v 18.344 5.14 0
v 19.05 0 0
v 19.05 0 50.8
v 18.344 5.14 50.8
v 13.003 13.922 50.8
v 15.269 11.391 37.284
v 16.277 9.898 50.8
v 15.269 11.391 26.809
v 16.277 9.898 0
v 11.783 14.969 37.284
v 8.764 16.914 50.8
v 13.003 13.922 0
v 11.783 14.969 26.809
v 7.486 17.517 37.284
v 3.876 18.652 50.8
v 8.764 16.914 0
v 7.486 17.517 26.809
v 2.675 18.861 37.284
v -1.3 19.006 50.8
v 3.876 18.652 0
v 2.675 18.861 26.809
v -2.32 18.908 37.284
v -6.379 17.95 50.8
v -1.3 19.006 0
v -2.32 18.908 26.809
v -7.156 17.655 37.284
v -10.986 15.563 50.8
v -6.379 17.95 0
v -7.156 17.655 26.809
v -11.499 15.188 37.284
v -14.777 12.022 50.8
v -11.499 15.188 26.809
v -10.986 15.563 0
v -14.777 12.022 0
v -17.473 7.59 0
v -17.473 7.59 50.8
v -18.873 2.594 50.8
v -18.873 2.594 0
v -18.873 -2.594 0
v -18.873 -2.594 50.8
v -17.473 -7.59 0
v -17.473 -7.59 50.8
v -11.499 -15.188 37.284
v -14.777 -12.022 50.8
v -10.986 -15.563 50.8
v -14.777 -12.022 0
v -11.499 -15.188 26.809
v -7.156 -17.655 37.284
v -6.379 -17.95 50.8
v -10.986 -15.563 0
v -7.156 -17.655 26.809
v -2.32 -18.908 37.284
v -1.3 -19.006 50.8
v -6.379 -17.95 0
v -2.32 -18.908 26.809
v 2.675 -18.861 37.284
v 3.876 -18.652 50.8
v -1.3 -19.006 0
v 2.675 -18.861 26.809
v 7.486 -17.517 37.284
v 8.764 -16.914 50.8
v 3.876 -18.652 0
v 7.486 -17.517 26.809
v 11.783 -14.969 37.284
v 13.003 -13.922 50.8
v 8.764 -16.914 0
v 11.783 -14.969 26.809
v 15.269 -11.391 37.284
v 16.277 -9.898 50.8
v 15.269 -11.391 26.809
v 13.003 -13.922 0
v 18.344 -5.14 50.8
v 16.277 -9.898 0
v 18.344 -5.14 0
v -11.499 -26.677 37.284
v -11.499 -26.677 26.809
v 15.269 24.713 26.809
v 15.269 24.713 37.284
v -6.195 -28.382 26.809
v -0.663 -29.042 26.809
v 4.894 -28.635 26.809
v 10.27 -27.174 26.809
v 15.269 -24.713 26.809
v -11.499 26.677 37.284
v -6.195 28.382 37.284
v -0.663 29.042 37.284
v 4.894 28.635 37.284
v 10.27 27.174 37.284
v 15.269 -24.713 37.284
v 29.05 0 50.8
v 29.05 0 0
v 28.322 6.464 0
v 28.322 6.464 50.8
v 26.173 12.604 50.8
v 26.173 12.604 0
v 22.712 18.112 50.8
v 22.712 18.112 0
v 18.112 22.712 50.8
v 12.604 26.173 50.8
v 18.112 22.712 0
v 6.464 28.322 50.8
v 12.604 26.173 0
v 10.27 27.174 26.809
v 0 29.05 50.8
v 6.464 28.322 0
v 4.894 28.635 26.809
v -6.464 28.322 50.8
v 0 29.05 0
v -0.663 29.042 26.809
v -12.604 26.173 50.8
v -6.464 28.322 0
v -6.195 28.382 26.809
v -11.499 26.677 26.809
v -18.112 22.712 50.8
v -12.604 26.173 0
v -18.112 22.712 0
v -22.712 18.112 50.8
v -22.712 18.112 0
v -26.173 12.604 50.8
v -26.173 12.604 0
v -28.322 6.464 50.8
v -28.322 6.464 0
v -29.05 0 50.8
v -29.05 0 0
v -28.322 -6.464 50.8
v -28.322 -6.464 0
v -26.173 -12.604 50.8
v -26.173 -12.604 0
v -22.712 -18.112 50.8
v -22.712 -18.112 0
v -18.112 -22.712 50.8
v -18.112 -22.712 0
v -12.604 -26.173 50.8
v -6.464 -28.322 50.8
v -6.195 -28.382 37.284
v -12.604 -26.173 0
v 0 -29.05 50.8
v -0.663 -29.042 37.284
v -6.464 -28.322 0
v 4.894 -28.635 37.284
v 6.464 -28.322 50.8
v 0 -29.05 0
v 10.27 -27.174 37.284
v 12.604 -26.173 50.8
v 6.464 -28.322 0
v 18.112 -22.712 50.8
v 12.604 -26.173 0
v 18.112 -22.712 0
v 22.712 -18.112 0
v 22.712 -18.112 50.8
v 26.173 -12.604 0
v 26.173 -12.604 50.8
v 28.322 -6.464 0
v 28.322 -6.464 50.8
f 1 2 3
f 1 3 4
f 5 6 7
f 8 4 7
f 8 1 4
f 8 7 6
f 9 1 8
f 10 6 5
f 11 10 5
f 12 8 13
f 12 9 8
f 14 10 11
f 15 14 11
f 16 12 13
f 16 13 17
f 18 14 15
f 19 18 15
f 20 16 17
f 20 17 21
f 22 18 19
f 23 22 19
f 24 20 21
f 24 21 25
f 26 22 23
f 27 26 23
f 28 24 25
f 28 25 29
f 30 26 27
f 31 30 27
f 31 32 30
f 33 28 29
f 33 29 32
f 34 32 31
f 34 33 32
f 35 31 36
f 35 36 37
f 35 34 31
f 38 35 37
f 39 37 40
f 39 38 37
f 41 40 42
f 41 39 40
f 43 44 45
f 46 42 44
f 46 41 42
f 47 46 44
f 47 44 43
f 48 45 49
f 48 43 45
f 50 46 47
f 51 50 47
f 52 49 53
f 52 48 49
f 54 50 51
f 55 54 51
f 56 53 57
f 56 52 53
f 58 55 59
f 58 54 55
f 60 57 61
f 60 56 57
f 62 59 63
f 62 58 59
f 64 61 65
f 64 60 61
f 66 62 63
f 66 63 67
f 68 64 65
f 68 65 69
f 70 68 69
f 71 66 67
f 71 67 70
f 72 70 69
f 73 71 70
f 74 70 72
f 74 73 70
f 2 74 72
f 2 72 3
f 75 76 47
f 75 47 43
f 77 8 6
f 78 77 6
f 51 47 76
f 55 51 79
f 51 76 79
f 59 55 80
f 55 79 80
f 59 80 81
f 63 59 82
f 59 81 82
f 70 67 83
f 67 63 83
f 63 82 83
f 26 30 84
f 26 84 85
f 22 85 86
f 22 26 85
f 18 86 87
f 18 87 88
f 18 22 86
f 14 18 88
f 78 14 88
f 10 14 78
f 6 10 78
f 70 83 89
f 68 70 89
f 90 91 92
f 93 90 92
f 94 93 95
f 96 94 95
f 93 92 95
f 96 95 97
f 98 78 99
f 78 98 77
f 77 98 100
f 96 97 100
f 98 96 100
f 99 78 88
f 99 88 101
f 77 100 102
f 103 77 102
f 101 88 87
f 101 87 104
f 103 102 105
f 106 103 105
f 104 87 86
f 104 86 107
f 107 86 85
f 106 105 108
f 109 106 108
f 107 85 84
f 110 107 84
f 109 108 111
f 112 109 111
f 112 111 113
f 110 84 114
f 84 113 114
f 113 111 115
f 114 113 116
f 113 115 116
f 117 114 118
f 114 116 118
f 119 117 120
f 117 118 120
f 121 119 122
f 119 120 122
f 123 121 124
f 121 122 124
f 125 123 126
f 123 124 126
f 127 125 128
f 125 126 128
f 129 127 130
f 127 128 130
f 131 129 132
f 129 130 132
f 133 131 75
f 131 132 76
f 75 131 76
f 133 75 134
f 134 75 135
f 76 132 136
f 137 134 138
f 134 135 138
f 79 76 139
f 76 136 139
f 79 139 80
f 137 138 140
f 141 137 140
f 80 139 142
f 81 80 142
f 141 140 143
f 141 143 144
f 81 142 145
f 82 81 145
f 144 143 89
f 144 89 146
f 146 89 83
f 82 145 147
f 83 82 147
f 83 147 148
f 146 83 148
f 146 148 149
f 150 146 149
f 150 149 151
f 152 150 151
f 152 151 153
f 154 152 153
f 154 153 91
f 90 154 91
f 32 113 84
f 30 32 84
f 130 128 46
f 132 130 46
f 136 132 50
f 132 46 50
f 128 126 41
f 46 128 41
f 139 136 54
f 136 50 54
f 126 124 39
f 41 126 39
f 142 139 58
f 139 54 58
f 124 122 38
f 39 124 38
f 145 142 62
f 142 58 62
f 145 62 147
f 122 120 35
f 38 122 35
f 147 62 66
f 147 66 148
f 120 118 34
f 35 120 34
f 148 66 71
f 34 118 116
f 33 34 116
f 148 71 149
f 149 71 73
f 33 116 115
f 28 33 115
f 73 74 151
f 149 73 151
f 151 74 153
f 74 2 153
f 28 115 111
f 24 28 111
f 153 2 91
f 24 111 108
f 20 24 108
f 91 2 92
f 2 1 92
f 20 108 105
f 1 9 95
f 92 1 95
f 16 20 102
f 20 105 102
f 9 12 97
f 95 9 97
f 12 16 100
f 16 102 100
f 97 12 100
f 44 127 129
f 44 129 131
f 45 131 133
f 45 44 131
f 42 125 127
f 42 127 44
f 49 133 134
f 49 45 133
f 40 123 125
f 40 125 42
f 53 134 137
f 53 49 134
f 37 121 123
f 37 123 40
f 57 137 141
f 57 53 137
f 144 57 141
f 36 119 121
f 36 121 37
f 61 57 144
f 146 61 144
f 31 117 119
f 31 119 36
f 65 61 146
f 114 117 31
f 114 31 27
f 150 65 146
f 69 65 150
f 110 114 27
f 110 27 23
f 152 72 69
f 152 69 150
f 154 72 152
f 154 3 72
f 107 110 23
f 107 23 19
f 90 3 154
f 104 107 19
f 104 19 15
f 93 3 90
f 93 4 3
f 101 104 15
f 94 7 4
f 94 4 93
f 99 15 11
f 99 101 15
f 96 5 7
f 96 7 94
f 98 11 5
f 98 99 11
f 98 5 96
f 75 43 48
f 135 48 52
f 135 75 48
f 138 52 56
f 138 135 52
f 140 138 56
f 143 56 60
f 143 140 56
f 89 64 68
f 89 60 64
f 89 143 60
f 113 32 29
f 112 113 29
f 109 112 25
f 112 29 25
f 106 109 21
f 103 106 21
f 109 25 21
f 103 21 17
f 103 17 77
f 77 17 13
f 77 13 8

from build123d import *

# Parameters (mm, degrees)
F0_R     = 29.05
F0_R_2   = 19.05
F1_DEPTH = 50.8
F2_W     = 26.768681
F2_H     = 10.474702
F3_DEPTH = 50.8


with BuildPart() as f1:
    # F0 (on Top) → F1 (new body)
    with BuildSketch(Plane.XY):
        Circle(F0_R)
        Circle(F0_R_2, mode=Mode.SUBTRACT)
    extrude(amount=F1_DEPTH)


with BuildPart() as f3:
    # F2 (on Front) → F3 (new body, symmetric)
    with BuildSketch(Plane.XZ):
        with Locations((1.88487, 32.046725)):
            Rectangle(F2_W, F2_H)
    extrude(amount=F3_DEPTH, both=True)


with BuildPart() as f1_1:
    add(f1.part)

    # F4: cut F3
    add(f3.part, mode=Mode.SUBTRACT)


solid = f1_1.part
